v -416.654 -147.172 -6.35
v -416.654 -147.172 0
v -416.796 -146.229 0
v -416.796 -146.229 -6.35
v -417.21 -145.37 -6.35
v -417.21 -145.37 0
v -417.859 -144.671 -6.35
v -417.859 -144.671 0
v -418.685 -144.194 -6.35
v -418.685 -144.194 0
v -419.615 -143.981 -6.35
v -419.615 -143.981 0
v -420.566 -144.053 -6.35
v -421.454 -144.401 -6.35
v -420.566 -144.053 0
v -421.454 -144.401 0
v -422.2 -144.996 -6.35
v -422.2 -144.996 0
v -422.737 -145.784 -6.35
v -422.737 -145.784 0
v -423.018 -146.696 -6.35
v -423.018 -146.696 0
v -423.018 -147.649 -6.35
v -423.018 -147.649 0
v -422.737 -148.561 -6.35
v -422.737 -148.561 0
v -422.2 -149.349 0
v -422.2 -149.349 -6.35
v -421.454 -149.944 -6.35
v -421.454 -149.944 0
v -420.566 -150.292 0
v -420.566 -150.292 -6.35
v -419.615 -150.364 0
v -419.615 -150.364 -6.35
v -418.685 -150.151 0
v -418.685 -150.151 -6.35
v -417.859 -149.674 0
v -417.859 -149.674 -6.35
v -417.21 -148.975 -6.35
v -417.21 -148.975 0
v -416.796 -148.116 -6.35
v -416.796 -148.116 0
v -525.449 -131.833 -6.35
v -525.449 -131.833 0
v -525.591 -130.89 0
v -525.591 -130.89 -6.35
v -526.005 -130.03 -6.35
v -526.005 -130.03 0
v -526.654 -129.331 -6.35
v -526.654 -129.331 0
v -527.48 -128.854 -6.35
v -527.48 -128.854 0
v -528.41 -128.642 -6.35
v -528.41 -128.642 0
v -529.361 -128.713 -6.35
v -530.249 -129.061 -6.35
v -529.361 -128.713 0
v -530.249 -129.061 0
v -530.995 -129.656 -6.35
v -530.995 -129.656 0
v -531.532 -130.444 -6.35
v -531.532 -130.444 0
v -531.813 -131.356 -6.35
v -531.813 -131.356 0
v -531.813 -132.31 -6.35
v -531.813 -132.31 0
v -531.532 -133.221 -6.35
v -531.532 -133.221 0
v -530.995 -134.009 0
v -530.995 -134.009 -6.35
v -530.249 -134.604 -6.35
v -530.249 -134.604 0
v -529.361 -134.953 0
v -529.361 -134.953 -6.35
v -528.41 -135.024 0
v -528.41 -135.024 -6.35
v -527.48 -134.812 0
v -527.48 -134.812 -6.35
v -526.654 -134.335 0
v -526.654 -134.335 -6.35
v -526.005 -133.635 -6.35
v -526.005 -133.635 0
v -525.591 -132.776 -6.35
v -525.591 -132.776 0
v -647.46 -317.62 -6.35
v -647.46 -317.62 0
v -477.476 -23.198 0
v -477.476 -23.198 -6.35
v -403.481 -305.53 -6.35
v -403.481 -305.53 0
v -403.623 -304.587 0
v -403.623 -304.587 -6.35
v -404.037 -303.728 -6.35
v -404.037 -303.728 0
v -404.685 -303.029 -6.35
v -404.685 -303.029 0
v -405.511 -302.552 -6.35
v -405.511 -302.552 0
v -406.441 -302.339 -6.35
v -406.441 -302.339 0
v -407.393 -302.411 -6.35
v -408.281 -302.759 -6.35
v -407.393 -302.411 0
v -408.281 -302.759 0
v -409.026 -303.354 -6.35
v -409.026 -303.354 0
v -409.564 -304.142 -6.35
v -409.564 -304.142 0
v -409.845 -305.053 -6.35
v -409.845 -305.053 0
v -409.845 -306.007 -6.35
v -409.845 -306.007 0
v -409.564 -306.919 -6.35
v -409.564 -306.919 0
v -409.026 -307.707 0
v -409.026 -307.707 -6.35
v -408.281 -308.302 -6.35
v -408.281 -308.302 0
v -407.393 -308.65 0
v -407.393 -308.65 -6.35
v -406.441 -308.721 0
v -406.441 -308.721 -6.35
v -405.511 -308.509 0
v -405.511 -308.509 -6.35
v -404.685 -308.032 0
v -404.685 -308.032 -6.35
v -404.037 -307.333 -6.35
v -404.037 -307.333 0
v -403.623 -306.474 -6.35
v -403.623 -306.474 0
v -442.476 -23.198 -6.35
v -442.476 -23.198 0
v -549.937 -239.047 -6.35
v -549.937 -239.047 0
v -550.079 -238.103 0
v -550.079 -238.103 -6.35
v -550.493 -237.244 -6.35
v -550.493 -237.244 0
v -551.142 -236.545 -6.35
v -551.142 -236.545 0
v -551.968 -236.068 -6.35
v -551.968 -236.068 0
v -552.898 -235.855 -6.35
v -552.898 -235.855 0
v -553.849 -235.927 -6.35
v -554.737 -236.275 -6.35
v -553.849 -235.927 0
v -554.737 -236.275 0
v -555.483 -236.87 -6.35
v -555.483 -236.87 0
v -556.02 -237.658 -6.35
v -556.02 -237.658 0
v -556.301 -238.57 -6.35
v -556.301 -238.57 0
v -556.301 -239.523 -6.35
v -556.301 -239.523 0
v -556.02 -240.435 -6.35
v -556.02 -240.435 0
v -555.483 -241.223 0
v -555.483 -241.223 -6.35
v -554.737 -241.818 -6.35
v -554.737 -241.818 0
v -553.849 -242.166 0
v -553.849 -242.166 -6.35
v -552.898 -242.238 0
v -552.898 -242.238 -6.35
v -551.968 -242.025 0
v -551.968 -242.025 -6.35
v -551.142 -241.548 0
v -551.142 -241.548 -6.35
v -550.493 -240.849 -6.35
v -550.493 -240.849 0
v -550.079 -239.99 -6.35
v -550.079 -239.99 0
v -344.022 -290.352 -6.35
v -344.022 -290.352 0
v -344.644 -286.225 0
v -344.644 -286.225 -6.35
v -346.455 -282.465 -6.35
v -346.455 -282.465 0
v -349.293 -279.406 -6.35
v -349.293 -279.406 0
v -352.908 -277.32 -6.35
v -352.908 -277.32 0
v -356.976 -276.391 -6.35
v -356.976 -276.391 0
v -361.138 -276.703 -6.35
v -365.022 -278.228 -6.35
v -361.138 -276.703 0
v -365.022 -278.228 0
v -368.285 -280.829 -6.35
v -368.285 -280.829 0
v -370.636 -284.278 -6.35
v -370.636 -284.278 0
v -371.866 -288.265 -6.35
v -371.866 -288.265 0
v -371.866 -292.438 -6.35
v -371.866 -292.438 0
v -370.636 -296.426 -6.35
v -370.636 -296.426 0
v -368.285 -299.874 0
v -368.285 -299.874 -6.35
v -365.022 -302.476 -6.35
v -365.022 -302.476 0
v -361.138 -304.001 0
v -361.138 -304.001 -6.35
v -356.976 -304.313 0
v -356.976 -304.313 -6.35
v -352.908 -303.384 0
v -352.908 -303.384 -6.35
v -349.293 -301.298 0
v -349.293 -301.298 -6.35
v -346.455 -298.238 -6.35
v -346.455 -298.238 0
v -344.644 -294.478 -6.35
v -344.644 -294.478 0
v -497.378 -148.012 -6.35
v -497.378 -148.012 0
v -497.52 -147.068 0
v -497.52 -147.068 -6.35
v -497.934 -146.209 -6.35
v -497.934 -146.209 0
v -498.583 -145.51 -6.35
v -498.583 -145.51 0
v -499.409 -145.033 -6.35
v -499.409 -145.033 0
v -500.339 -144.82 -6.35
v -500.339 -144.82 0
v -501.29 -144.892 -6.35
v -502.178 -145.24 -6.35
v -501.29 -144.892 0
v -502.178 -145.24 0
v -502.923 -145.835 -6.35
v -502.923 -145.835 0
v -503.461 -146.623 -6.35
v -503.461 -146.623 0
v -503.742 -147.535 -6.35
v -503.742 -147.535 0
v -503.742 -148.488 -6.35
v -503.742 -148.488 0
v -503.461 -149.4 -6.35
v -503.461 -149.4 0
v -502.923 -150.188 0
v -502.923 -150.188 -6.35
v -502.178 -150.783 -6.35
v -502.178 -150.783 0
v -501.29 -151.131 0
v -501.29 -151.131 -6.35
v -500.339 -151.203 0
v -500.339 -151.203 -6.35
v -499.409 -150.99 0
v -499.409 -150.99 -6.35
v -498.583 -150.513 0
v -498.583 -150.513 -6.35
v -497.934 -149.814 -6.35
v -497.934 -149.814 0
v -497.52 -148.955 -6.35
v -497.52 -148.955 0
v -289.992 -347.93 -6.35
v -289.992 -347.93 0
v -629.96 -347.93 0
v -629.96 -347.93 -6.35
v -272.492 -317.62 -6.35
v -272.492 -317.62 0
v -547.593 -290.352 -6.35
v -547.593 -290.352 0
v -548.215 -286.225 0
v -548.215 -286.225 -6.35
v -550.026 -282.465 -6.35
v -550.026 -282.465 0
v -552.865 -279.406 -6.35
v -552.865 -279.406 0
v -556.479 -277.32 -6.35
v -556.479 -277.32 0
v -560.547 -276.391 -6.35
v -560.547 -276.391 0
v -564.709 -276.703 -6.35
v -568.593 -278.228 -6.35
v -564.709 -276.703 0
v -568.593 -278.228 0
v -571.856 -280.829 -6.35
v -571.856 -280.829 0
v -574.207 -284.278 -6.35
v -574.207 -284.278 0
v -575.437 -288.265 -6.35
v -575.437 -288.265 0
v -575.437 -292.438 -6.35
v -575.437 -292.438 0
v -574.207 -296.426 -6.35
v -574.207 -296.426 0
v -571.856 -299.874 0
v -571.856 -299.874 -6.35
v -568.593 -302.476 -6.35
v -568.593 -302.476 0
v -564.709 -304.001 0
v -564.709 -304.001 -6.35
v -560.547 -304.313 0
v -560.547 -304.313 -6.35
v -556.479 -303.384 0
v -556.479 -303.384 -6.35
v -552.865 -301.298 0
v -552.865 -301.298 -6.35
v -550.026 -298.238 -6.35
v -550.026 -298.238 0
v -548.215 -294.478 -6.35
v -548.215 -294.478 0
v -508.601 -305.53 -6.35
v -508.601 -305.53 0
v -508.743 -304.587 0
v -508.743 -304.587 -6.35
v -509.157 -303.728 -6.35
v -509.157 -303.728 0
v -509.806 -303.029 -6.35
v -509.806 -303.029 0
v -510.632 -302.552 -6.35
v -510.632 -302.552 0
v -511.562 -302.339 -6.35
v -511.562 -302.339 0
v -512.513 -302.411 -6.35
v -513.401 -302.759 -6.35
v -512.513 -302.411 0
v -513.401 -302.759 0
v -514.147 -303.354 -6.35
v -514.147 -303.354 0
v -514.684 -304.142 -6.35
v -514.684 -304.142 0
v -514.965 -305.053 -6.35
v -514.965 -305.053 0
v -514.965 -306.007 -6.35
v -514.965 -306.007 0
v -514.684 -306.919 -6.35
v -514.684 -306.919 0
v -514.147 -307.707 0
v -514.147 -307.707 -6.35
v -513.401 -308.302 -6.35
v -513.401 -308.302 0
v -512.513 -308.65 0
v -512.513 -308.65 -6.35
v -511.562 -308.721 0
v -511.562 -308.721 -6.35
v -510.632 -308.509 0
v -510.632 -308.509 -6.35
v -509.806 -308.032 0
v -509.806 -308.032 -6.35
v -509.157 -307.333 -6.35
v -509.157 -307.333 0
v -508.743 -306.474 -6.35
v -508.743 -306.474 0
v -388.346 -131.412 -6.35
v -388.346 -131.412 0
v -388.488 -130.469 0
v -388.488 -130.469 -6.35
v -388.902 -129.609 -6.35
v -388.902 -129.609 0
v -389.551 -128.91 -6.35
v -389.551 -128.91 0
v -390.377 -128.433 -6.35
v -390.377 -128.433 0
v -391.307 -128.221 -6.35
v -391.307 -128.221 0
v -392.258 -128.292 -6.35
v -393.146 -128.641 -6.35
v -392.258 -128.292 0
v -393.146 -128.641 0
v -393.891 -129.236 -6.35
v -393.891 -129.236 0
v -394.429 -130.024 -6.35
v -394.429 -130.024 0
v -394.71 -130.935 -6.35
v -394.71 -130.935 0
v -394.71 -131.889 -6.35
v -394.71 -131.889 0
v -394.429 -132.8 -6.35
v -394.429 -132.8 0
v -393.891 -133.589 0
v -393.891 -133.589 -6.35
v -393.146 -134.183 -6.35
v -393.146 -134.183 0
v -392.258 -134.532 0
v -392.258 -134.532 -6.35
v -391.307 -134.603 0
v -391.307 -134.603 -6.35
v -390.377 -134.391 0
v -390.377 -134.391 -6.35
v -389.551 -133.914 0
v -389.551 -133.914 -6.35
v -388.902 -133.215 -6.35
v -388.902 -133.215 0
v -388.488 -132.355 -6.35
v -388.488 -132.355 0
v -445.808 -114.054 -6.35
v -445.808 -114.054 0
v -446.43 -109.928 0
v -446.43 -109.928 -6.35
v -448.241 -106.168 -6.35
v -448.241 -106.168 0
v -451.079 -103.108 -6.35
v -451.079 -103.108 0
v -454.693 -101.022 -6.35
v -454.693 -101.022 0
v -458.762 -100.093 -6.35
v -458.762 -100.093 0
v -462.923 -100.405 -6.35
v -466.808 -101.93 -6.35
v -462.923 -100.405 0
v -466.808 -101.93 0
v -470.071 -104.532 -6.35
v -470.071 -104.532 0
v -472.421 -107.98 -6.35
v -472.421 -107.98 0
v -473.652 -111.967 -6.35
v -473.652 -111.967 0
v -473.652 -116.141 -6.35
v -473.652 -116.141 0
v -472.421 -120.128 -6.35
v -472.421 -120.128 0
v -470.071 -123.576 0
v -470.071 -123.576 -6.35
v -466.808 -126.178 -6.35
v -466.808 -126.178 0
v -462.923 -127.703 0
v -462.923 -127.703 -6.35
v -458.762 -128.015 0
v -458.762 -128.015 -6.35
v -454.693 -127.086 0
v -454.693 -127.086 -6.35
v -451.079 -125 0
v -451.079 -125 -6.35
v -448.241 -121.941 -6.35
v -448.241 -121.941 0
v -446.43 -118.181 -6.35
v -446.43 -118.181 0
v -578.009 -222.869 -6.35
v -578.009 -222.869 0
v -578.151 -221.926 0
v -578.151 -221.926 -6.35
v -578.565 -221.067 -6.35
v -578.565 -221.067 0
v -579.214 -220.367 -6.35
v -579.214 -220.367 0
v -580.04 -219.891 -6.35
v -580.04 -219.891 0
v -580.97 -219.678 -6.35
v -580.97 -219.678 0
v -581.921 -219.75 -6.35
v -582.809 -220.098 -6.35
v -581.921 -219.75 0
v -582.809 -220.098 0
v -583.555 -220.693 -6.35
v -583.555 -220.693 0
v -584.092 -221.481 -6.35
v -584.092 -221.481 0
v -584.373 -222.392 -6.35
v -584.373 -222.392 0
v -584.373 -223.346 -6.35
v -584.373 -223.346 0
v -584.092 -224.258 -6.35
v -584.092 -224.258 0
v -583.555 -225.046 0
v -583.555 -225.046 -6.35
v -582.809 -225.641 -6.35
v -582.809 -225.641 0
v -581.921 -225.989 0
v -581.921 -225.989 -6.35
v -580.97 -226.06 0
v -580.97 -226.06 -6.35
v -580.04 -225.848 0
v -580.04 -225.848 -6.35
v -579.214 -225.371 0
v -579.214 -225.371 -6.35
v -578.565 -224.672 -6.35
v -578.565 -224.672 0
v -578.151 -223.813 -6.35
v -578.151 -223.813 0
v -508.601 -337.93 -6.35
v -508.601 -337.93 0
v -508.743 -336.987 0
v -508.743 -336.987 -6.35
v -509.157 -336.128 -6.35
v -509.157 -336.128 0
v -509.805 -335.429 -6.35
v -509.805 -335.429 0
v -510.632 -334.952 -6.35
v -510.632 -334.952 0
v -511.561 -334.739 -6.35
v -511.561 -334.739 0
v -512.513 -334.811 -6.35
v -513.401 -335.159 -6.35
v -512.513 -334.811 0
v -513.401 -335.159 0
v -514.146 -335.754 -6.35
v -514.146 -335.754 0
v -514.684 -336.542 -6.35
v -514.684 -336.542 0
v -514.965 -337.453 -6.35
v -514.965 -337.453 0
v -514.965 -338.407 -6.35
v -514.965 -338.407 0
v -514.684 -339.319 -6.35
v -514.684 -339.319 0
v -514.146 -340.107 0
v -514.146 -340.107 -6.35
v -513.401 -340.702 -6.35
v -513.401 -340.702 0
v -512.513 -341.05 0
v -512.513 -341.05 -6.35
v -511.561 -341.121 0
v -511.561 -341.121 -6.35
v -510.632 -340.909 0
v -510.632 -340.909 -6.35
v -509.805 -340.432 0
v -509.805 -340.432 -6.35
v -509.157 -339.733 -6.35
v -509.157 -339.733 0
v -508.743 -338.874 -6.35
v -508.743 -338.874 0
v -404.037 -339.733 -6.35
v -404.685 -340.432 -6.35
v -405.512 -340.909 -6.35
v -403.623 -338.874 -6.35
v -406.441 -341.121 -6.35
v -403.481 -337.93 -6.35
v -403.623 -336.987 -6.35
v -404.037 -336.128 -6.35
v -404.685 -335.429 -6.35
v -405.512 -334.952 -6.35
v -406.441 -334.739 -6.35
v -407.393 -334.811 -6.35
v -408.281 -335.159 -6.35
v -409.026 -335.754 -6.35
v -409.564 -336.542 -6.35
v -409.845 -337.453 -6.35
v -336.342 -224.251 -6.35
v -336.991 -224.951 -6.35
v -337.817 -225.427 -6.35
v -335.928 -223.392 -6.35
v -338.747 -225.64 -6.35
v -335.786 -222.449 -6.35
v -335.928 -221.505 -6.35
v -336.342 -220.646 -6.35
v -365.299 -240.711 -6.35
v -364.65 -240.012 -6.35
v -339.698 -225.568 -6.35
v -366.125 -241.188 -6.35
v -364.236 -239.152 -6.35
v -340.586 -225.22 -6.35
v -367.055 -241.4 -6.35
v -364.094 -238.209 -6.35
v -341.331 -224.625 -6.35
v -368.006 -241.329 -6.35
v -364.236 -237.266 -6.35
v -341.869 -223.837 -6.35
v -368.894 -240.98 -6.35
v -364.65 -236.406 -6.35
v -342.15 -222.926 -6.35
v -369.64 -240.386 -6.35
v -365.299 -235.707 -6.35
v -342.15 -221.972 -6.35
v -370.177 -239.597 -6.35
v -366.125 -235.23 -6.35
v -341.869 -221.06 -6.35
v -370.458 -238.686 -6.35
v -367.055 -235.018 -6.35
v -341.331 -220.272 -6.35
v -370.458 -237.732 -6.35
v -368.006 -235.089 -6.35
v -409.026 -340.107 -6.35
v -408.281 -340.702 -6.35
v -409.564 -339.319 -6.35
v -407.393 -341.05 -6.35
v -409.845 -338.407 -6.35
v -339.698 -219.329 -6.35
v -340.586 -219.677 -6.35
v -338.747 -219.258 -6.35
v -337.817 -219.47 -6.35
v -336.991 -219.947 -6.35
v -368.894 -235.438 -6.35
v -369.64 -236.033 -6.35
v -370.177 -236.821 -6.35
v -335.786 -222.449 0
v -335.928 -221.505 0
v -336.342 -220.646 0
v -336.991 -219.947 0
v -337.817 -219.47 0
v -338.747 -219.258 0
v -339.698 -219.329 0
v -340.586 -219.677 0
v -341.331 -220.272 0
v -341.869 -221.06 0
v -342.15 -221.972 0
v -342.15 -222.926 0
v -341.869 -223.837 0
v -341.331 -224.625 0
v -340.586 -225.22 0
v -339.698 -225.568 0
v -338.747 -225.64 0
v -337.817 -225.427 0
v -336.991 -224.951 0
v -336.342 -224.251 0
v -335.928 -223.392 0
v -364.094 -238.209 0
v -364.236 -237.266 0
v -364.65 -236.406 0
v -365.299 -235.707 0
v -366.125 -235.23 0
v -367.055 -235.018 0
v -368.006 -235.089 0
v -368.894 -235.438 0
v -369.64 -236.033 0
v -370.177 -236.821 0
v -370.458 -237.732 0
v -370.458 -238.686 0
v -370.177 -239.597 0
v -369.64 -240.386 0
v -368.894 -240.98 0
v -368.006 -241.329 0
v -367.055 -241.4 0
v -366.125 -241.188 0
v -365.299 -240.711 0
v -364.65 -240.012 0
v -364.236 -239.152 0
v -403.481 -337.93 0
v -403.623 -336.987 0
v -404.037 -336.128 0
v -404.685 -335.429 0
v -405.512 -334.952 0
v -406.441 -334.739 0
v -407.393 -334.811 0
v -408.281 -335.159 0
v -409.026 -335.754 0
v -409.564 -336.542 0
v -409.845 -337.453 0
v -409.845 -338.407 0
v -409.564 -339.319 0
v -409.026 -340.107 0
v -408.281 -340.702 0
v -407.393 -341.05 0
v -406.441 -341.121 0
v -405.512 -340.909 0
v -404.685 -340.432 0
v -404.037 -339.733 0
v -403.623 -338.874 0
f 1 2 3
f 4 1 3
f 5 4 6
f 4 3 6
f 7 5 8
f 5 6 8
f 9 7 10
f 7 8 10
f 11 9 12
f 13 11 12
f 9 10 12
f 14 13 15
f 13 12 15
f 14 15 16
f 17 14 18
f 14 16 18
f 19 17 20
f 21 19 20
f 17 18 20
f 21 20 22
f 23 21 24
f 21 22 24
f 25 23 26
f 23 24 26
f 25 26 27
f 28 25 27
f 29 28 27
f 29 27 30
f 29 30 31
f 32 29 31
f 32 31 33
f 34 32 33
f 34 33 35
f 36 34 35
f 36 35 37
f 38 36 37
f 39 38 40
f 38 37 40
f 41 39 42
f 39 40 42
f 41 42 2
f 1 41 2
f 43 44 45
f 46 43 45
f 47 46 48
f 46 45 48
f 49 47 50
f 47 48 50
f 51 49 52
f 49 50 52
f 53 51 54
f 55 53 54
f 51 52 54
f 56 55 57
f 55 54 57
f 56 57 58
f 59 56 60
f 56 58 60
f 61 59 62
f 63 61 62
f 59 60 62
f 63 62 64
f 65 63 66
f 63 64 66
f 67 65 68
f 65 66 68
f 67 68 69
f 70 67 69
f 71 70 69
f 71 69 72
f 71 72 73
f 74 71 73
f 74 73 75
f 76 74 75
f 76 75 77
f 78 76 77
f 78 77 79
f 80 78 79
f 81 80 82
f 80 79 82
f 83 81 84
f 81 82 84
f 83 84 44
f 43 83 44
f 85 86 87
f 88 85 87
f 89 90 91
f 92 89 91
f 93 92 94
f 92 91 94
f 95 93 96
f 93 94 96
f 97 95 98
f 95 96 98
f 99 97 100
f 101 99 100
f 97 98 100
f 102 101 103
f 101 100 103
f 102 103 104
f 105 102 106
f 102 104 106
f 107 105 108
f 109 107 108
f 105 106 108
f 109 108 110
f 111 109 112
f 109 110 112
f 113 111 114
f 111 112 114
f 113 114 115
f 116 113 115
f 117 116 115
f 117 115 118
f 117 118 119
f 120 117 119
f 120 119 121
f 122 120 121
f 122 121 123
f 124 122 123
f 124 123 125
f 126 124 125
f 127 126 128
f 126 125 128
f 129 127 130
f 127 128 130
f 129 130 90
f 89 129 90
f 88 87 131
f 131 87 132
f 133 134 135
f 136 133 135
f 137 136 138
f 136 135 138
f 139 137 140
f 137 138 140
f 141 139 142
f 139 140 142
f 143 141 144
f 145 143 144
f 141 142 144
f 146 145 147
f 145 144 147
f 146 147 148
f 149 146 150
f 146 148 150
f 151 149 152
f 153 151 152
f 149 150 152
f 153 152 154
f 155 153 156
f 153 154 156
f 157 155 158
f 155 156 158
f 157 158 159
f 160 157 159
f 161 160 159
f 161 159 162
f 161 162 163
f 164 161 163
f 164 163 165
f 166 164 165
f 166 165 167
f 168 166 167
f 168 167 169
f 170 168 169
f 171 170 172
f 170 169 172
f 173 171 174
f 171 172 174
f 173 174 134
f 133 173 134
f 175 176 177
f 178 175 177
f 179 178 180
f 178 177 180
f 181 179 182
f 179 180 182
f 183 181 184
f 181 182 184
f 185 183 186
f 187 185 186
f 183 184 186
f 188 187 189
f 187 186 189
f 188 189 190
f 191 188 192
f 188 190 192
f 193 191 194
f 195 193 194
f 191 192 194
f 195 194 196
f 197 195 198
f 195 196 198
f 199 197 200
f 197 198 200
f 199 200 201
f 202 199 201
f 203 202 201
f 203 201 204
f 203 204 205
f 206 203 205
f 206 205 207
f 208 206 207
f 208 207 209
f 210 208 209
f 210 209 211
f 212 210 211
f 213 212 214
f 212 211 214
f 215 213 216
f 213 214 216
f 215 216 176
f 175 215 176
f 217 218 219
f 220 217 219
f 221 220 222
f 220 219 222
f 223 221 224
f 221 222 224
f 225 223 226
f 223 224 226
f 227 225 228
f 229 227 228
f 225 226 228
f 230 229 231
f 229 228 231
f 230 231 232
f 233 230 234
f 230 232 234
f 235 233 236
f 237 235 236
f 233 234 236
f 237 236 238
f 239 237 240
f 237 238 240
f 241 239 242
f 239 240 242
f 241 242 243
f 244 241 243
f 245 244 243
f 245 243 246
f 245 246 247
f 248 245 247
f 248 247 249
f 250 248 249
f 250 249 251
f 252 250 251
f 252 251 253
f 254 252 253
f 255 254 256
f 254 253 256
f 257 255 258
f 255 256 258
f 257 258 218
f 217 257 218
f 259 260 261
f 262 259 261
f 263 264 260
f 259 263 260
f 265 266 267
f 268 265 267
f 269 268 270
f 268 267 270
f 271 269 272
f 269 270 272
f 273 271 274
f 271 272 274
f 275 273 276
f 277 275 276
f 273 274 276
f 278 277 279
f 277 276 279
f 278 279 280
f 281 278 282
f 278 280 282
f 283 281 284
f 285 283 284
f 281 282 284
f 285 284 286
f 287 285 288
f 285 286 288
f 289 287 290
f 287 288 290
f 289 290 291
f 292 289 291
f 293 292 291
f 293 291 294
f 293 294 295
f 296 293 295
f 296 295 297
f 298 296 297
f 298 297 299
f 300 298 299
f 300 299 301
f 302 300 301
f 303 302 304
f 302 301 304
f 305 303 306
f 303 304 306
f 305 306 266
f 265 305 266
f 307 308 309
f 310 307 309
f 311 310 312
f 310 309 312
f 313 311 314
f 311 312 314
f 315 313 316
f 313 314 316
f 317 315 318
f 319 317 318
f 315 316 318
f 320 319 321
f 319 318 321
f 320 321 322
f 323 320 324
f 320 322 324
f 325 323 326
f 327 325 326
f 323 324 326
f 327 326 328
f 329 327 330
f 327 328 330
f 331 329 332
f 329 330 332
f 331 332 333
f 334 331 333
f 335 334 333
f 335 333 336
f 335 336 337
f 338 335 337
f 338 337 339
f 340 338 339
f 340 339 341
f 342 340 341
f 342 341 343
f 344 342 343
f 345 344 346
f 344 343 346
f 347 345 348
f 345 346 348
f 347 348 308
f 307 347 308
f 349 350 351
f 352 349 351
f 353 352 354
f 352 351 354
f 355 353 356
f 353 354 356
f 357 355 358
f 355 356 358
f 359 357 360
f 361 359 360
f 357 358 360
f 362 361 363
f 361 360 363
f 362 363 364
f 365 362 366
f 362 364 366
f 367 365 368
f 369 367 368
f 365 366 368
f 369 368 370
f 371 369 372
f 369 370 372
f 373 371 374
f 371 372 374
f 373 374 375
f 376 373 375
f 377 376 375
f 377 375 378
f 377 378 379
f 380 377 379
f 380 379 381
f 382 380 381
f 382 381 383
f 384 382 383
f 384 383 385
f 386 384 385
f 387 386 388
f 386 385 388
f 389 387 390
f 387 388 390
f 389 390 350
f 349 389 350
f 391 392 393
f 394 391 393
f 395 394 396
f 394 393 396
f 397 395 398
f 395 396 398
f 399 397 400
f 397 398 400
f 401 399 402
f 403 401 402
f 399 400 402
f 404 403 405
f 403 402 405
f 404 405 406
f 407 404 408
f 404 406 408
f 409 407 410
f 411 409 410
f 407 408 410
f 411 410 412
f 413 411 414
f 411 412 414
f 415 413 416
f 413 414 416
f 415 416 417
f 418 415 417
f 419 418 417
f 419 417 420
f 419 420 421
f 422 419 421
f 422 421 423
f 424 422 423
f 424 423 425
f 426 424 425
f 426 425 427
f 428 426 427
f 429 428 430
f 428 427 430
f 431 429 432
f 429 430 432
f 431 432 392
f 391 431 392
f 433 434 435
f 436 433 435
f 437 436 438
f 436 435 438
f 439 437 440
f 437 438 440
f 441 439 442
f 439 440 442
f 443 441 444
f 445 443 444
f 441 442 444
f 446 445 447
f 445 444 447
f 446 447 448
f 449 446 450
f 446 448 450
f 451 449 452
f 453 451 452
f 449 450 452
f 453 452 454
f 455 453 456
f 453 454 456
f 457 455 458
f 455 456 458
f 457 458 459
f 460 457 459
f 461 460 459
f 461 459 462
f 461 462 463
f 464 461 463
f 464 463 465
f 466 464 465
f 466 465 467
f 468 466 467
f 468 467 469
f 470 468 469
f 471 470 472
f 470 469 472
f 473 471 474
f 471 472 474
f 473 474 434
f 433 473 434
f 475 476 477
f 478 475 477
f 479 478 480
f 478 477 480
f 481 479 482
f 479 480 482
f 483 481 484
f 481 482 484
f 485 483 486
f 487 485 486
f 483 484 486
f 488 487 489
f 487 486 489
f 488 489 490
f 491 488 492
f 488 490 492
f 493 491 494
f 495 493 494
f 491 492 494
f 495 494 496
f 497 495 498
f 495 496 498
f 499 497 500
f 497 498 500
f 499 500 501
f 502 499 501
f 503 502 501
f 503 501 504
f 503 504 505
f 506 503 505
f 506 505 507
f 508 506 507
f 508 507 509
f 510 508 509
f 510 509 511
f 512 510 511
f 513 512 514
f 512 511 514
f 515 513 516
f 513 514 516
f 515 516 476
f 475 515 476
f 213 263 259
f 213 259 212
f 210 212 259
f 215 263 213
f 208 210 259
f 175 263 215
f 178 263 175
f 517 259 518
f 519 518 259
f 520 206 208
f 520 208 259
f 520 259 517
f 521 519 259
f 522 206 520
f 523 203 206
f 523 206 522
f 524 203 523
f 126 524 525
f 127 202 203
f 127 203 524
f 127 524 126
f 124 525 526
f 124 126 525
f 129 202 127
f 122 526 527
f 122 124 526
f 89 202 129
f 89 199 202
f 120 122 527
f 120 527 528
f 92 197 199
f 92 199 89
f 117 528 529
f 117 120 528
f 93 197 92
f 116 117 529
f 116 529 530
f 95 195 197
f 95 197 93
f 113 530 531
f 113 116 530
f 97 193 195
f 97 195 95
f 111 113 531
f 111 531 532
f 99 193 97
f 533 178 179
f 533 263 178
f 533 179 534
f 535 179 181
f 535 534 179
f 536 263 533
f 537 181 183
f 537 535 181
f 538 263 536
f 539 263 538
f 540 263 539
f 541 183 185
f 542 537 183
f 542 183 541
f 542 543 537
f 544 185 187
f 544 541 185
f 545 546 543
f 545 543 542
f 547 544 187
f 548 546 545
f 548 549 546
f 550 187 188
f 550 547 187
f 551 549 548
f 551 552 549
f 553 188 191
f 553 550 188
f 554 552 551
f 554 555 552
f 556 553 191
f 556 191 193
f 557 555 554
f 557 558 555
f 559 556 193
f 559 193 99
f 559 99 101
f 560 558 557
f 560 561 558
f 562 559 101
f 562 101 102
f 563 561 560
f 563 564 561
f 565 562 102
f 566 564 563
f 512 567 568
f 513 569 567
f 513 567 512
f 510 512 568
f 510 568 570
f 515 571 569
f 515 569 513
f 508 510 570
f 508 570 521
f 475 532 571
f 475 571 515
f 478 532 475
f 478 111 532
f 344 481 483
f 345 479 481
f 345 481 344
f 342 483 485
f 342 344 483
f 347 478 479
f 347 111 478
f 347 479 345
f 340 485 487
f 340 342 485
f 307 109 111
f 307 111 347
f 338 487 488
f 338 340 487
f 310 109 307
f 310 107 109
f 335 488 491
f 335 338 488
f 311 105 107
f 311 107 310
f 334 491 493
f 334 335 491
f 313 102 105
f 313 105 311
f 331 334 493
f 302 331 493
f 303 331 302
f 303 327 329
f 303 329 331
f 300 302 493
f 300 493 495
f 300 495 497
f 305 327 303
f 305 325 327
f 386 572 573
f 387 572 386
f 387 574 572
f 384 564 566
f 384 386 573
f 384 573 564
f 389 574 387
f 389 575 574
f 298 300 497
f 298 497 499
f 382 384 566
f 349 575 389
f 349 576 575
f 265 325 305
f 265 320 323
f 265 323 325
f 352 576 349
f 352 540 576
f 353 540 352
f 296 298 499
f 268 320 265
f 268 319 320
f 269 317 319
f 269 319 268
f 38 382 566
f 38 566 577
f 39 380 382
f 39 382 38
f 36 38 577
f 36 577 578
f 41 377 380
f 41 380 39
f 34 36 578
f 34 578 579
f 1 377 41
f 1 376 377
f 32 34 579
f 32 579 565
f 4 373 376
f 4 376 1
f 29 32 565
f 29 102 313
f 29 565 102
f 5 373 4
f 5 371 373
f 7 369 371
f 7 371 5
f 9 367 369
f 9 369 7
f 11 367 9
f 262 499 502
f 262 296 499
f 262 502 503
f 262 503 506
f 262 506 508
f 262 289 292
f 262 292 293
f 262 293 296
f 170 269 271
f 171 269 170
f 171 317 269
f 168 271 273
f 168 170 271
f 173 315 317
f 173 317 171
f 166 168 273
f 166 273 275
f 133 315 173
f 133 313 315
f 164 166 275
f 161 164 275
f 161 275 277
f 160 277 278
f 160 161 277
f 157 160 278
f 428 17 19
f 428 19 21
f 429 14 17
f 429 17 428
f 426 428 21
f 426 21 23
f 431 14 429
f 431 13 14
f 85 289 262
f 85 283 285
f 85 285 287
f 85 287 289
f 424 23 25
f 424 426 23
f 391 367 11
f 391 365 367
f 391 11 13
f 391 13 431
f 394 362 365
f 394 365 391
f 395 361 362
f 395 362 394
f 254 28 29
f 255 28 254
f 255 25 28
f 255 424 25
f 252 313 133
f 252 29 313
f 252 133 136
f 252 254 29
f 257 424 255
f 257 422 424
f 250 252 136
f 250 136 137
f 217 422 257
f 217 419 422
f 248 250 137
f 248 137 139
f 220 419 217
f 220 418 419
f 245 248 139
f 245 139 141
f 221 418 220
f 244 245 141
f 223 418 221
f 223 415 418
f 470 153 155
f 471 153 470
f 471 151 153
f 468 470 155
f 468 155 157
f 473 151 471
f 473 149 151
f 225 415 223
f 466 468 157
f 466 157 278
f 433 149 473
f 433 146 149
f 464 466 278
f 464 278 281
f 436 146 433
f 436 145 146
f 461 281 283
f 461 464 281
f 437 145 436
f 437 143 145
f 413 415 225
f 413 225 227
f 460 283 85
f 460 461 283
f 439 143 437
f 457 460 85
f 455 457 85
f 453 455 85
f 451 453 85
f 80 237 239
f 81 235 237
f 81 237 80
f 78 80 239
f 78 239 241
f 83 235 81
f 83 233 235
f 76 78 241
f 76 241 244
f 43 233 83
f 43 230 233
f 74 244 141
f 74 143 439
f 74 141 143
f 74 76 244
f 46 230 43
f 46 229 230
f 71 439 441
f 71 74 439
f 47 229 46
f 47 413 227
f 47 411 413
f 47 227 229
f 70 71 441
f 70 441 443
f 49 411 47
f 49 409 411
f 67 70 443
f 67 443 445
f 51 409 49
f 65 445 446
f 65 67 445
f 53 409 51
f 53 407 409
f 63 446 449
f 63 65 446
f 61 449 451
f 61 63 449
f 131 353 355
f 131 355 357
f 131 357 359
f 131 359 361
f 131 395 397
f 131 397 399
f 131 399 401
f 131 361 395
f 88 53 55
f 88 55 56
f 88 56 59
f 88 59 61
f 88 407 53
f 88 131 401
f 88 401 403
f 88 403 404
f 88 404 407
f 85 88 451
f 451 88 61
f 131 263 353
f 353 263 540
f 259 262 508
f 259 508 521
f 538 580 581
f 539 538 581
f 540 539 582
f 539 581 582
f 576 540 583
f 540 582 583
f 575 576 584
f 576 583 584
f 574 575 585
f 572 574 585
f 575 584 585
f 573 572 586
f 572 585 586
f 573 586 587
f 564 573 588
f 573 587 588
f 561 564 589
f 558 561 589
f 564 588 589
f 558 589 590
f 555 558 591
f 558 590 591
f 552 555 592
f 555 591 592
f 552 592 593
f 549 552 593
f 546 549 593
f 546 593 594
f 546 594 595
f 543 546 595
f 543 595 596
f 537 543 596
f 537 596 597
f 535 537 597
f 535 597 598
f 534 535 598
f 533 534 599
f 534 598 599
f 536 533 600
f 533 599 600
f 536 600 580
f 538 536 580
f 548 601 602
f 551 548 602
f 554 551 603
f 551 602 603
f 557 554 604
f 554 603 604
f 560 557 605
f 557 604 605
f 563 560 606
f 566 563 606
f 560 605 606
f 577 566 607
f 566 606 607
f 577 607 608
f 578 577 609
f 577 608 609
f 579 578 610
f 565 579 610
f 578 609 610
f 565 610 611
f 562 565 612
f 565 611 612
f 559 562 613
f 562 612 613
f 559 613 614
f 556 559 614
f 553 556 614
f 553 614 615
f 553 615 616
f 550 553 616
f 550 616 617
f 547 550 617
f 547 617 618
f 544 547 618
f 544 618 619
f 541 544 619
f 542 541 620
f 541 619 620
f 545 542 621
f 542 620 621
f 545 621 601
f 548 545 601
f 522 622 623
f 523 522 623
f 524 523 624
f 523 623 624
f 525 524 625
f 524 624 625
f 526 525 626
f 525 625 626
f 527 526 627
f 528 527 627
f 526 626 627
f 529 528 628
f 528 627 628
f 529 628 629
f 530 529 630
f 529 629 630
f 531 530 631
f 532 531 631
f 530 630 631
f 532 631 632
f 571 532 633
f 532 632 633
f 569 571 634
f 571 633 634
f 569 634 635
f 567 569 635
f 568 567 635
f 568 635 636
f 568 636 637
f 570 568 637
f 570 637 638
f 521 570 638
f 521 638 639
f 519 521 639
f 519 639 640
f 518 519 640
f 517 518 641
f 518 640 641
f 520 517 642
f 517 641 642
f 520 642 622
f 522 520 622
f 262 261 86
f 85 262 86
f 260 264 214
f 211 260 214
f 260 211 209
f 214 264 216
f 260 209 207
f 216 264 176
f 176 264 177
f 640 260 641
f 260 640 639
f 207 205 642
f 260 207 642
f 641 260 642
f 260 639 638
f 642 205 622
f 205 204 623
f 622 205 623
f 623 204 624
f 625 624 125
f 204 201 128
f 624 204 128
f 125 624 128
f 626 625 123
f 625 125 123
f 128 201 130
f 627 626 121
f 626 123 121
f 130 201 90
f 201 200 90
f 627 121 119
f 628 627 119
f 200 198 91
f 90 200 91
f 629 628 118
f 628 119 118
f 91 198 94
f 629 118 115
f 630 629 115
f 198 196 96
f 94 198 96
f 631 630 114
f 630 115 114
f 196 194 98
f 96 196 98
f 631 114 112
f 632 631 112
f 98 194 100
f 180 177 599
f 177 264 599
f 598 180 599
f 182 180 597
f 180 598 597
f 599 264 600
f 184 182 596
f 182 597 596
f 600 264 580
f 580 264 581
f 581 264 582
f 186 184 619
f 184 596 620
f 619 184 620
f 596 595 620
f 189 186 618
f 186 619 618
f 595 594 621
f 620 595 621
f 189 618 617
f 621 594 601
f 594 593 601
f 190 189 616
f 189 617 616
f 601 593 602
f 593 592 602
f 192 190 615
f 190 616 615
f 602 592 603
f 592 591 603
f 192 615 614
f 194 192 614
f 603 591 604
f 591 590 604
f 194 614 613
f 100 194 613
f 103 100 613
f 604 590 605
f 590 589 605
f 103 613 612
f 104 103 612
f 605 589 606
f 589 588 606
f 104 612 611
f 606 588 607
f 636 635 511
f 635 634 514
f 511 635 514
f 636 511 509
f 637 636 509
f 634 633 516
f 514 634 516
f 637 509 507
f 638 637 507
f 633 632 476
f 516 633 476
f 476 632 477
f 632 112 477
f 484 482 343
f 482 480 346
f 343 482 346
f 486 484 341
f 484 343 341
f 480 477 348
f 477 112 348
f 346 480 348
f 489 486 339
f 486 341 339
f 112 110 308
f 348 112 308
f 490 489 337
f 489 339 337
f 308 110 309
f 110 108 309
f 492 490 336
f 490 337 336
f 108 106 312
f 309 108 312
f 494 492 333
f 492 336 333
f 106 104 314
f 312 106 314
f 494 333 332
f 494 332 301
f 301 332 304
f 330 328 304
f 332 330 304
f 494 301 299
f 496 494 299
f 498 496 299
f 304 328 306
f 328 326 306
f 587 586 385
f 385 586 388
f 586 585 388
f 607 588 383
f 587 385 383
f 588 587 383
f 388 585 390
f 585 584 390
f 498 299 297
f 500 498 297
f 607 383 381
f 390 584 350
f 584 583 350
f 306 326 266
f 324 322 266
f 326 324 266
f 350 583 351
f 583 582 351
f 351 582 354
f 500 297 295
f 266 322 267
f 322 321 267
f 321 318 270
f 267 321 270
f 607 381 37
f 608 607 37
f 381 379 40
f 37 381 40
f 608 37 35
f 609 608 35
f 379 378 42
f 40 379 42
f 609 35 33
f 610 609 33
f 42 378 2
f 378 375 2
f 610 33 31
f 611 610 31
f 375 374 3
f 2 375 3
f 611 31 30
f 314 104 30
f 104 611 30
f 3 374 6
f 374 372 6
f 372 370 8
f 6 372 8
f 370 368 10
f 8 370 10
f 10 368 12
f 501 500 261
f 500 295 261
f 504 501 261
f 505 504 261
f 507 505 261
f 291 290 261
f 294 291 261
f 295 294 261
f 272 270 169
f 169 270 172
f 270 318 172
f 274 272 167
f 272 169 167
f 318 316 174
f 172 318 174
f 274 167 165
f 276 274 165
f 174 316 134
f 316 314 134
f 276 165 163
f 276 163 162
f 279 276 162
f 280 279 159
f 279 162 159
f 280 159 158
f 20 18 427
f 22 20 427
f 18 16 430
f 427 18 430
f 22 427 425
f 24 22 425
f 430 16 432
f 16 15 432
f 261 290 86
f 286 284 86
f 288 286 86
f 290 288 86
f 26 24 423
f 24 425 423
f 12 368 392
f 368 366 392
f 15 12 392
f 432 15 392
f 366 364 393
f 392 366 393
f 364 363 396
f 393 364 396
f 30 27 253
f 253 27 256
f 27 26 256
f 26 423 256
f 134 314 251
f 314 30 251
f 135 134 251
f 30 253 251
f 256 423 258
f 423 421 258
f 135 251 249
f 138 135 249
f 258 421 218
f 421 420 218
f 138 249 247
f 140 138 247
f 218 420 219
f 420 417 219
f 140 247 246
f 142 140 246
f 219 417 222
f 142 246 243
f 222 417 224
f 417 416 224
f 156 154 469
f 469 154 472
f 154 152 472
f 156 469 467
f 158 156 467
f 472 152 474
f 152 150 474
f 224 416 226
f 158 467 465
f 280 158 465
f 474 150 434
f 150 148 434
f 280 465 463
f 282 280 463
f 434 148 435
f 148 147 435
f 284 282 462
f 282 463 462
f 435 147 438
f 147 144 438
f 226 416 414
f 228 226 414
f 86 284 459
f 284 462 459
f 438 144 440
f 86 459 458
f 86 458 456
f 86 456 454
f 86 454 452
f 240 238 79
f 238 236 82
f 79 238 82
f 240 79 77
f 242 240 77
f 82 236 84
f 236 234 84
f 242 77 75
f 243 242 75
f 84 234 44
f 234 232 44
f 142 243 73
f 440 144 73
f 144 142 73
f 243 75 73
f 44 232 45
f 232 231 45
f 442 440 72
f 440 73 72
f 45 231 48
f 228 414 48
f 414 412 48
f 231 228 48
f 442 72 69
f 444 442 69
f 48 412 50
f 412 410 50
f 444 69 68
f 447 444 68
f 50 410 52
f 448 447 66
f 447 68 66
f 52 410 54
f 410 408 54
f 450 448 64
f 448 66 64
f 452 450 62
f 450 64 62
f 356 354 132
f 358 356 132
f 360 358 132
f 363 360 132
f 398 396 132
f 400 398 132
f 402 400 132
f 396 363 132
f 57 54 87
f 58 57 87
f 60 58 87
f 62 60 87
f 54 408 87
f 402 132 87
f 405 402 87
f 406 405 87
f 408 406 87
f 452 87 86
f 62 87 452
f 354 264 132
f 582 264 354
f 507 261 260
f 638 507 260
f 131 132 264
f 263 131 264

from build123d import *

# Parameters (mm, degrees)
SKETCH1_R           = 3.2
SKETCH1_R_2         = 14
BOSS_EXTRUDE1_DEPTH = 6.35


with BuildPart() as part:
    # Sketch1 → Boss-Extrude1 (new body)
    with BuildSketch(Plane.XY):
        Polygon((-647.460250444, -317.619540534), (-477.475995614, -23.198174681), (-442.475995614, -23.198174681), (-272.491740783, -317.619540534), (-289.991740783, -347.930429667), (-629.960250444, -347.930429667), align=None)
        with Locations((-581.209182953, -222.869325584)):
            Circle(SKETCH1_R, mode=Mode.SUBTRACT)
        with Locations((-528.649182953, -131.832735139)):
            Circle(SKETCH1_R, mode=Mode.SUBTRACT)
        with Locations((-500.577727615, -148.011529753)):
            Circle(SKETCH1_R, mode=Mode.SUBTRACT)
        with Locations((-553.136815613, -239.046537702)):
            Circle(SKETCH1_R, mode=Mode.SUBTRACT)
        with Locations((-367.294158494, -238.209054553)):
            Circle(SKETCH1_R, mode=Mode.SUBTRACT)
        with Locations((-419.854158494, -147.172464107)):
            Circle(SKETCH1_R, mode=Mode.SUBTRACT)
        with Locations((-391.545684719, -131.412060795)):
            Circle(SKETCH1_R, mode=Mode.SUBTRACT)
        with Locations((-338.985684719, -222.448651241)):
            Circle(SKETCH1_R, mode=Mode.SUBTRACT)
        with Locations((-511.800751787, -305.530429667)):
            Circle(SKETCH1_R, mode=Mode.SUBTRACT)
        with Locations((-406.680508256, -305.530429667)):
            Circle(SKETCH1_R, mode=Mode.SUBTRACT)
        with Locations((-406.680630022, -337.930429667)):
            Circle(SKETCH1_R, mode=Mode.SUBTRACT)
        with Locations((-511.800630022, -337.930429667)):
            Circle(SKETCH1_R, mode=Mode.SUBTRACT)
        with Locations((-459.807870528, -114.054080446)):
            Circle(SKETCH1_R_2, mode=Mode.SUBTRACT)
        with Locations((-358.022290508, -290.351876517)):
            Circle(SKETCH1_R_2, mode=Mode.SUBTRACT)
        with Locations((-561.593450547, -290.351876517)):
            Circle(SKETCH1_R_2, mode=Mode.SUBTRACT)
    extrude(amount=-BOSS_EXTRUDE1_DEPTH)


solid = part.part
